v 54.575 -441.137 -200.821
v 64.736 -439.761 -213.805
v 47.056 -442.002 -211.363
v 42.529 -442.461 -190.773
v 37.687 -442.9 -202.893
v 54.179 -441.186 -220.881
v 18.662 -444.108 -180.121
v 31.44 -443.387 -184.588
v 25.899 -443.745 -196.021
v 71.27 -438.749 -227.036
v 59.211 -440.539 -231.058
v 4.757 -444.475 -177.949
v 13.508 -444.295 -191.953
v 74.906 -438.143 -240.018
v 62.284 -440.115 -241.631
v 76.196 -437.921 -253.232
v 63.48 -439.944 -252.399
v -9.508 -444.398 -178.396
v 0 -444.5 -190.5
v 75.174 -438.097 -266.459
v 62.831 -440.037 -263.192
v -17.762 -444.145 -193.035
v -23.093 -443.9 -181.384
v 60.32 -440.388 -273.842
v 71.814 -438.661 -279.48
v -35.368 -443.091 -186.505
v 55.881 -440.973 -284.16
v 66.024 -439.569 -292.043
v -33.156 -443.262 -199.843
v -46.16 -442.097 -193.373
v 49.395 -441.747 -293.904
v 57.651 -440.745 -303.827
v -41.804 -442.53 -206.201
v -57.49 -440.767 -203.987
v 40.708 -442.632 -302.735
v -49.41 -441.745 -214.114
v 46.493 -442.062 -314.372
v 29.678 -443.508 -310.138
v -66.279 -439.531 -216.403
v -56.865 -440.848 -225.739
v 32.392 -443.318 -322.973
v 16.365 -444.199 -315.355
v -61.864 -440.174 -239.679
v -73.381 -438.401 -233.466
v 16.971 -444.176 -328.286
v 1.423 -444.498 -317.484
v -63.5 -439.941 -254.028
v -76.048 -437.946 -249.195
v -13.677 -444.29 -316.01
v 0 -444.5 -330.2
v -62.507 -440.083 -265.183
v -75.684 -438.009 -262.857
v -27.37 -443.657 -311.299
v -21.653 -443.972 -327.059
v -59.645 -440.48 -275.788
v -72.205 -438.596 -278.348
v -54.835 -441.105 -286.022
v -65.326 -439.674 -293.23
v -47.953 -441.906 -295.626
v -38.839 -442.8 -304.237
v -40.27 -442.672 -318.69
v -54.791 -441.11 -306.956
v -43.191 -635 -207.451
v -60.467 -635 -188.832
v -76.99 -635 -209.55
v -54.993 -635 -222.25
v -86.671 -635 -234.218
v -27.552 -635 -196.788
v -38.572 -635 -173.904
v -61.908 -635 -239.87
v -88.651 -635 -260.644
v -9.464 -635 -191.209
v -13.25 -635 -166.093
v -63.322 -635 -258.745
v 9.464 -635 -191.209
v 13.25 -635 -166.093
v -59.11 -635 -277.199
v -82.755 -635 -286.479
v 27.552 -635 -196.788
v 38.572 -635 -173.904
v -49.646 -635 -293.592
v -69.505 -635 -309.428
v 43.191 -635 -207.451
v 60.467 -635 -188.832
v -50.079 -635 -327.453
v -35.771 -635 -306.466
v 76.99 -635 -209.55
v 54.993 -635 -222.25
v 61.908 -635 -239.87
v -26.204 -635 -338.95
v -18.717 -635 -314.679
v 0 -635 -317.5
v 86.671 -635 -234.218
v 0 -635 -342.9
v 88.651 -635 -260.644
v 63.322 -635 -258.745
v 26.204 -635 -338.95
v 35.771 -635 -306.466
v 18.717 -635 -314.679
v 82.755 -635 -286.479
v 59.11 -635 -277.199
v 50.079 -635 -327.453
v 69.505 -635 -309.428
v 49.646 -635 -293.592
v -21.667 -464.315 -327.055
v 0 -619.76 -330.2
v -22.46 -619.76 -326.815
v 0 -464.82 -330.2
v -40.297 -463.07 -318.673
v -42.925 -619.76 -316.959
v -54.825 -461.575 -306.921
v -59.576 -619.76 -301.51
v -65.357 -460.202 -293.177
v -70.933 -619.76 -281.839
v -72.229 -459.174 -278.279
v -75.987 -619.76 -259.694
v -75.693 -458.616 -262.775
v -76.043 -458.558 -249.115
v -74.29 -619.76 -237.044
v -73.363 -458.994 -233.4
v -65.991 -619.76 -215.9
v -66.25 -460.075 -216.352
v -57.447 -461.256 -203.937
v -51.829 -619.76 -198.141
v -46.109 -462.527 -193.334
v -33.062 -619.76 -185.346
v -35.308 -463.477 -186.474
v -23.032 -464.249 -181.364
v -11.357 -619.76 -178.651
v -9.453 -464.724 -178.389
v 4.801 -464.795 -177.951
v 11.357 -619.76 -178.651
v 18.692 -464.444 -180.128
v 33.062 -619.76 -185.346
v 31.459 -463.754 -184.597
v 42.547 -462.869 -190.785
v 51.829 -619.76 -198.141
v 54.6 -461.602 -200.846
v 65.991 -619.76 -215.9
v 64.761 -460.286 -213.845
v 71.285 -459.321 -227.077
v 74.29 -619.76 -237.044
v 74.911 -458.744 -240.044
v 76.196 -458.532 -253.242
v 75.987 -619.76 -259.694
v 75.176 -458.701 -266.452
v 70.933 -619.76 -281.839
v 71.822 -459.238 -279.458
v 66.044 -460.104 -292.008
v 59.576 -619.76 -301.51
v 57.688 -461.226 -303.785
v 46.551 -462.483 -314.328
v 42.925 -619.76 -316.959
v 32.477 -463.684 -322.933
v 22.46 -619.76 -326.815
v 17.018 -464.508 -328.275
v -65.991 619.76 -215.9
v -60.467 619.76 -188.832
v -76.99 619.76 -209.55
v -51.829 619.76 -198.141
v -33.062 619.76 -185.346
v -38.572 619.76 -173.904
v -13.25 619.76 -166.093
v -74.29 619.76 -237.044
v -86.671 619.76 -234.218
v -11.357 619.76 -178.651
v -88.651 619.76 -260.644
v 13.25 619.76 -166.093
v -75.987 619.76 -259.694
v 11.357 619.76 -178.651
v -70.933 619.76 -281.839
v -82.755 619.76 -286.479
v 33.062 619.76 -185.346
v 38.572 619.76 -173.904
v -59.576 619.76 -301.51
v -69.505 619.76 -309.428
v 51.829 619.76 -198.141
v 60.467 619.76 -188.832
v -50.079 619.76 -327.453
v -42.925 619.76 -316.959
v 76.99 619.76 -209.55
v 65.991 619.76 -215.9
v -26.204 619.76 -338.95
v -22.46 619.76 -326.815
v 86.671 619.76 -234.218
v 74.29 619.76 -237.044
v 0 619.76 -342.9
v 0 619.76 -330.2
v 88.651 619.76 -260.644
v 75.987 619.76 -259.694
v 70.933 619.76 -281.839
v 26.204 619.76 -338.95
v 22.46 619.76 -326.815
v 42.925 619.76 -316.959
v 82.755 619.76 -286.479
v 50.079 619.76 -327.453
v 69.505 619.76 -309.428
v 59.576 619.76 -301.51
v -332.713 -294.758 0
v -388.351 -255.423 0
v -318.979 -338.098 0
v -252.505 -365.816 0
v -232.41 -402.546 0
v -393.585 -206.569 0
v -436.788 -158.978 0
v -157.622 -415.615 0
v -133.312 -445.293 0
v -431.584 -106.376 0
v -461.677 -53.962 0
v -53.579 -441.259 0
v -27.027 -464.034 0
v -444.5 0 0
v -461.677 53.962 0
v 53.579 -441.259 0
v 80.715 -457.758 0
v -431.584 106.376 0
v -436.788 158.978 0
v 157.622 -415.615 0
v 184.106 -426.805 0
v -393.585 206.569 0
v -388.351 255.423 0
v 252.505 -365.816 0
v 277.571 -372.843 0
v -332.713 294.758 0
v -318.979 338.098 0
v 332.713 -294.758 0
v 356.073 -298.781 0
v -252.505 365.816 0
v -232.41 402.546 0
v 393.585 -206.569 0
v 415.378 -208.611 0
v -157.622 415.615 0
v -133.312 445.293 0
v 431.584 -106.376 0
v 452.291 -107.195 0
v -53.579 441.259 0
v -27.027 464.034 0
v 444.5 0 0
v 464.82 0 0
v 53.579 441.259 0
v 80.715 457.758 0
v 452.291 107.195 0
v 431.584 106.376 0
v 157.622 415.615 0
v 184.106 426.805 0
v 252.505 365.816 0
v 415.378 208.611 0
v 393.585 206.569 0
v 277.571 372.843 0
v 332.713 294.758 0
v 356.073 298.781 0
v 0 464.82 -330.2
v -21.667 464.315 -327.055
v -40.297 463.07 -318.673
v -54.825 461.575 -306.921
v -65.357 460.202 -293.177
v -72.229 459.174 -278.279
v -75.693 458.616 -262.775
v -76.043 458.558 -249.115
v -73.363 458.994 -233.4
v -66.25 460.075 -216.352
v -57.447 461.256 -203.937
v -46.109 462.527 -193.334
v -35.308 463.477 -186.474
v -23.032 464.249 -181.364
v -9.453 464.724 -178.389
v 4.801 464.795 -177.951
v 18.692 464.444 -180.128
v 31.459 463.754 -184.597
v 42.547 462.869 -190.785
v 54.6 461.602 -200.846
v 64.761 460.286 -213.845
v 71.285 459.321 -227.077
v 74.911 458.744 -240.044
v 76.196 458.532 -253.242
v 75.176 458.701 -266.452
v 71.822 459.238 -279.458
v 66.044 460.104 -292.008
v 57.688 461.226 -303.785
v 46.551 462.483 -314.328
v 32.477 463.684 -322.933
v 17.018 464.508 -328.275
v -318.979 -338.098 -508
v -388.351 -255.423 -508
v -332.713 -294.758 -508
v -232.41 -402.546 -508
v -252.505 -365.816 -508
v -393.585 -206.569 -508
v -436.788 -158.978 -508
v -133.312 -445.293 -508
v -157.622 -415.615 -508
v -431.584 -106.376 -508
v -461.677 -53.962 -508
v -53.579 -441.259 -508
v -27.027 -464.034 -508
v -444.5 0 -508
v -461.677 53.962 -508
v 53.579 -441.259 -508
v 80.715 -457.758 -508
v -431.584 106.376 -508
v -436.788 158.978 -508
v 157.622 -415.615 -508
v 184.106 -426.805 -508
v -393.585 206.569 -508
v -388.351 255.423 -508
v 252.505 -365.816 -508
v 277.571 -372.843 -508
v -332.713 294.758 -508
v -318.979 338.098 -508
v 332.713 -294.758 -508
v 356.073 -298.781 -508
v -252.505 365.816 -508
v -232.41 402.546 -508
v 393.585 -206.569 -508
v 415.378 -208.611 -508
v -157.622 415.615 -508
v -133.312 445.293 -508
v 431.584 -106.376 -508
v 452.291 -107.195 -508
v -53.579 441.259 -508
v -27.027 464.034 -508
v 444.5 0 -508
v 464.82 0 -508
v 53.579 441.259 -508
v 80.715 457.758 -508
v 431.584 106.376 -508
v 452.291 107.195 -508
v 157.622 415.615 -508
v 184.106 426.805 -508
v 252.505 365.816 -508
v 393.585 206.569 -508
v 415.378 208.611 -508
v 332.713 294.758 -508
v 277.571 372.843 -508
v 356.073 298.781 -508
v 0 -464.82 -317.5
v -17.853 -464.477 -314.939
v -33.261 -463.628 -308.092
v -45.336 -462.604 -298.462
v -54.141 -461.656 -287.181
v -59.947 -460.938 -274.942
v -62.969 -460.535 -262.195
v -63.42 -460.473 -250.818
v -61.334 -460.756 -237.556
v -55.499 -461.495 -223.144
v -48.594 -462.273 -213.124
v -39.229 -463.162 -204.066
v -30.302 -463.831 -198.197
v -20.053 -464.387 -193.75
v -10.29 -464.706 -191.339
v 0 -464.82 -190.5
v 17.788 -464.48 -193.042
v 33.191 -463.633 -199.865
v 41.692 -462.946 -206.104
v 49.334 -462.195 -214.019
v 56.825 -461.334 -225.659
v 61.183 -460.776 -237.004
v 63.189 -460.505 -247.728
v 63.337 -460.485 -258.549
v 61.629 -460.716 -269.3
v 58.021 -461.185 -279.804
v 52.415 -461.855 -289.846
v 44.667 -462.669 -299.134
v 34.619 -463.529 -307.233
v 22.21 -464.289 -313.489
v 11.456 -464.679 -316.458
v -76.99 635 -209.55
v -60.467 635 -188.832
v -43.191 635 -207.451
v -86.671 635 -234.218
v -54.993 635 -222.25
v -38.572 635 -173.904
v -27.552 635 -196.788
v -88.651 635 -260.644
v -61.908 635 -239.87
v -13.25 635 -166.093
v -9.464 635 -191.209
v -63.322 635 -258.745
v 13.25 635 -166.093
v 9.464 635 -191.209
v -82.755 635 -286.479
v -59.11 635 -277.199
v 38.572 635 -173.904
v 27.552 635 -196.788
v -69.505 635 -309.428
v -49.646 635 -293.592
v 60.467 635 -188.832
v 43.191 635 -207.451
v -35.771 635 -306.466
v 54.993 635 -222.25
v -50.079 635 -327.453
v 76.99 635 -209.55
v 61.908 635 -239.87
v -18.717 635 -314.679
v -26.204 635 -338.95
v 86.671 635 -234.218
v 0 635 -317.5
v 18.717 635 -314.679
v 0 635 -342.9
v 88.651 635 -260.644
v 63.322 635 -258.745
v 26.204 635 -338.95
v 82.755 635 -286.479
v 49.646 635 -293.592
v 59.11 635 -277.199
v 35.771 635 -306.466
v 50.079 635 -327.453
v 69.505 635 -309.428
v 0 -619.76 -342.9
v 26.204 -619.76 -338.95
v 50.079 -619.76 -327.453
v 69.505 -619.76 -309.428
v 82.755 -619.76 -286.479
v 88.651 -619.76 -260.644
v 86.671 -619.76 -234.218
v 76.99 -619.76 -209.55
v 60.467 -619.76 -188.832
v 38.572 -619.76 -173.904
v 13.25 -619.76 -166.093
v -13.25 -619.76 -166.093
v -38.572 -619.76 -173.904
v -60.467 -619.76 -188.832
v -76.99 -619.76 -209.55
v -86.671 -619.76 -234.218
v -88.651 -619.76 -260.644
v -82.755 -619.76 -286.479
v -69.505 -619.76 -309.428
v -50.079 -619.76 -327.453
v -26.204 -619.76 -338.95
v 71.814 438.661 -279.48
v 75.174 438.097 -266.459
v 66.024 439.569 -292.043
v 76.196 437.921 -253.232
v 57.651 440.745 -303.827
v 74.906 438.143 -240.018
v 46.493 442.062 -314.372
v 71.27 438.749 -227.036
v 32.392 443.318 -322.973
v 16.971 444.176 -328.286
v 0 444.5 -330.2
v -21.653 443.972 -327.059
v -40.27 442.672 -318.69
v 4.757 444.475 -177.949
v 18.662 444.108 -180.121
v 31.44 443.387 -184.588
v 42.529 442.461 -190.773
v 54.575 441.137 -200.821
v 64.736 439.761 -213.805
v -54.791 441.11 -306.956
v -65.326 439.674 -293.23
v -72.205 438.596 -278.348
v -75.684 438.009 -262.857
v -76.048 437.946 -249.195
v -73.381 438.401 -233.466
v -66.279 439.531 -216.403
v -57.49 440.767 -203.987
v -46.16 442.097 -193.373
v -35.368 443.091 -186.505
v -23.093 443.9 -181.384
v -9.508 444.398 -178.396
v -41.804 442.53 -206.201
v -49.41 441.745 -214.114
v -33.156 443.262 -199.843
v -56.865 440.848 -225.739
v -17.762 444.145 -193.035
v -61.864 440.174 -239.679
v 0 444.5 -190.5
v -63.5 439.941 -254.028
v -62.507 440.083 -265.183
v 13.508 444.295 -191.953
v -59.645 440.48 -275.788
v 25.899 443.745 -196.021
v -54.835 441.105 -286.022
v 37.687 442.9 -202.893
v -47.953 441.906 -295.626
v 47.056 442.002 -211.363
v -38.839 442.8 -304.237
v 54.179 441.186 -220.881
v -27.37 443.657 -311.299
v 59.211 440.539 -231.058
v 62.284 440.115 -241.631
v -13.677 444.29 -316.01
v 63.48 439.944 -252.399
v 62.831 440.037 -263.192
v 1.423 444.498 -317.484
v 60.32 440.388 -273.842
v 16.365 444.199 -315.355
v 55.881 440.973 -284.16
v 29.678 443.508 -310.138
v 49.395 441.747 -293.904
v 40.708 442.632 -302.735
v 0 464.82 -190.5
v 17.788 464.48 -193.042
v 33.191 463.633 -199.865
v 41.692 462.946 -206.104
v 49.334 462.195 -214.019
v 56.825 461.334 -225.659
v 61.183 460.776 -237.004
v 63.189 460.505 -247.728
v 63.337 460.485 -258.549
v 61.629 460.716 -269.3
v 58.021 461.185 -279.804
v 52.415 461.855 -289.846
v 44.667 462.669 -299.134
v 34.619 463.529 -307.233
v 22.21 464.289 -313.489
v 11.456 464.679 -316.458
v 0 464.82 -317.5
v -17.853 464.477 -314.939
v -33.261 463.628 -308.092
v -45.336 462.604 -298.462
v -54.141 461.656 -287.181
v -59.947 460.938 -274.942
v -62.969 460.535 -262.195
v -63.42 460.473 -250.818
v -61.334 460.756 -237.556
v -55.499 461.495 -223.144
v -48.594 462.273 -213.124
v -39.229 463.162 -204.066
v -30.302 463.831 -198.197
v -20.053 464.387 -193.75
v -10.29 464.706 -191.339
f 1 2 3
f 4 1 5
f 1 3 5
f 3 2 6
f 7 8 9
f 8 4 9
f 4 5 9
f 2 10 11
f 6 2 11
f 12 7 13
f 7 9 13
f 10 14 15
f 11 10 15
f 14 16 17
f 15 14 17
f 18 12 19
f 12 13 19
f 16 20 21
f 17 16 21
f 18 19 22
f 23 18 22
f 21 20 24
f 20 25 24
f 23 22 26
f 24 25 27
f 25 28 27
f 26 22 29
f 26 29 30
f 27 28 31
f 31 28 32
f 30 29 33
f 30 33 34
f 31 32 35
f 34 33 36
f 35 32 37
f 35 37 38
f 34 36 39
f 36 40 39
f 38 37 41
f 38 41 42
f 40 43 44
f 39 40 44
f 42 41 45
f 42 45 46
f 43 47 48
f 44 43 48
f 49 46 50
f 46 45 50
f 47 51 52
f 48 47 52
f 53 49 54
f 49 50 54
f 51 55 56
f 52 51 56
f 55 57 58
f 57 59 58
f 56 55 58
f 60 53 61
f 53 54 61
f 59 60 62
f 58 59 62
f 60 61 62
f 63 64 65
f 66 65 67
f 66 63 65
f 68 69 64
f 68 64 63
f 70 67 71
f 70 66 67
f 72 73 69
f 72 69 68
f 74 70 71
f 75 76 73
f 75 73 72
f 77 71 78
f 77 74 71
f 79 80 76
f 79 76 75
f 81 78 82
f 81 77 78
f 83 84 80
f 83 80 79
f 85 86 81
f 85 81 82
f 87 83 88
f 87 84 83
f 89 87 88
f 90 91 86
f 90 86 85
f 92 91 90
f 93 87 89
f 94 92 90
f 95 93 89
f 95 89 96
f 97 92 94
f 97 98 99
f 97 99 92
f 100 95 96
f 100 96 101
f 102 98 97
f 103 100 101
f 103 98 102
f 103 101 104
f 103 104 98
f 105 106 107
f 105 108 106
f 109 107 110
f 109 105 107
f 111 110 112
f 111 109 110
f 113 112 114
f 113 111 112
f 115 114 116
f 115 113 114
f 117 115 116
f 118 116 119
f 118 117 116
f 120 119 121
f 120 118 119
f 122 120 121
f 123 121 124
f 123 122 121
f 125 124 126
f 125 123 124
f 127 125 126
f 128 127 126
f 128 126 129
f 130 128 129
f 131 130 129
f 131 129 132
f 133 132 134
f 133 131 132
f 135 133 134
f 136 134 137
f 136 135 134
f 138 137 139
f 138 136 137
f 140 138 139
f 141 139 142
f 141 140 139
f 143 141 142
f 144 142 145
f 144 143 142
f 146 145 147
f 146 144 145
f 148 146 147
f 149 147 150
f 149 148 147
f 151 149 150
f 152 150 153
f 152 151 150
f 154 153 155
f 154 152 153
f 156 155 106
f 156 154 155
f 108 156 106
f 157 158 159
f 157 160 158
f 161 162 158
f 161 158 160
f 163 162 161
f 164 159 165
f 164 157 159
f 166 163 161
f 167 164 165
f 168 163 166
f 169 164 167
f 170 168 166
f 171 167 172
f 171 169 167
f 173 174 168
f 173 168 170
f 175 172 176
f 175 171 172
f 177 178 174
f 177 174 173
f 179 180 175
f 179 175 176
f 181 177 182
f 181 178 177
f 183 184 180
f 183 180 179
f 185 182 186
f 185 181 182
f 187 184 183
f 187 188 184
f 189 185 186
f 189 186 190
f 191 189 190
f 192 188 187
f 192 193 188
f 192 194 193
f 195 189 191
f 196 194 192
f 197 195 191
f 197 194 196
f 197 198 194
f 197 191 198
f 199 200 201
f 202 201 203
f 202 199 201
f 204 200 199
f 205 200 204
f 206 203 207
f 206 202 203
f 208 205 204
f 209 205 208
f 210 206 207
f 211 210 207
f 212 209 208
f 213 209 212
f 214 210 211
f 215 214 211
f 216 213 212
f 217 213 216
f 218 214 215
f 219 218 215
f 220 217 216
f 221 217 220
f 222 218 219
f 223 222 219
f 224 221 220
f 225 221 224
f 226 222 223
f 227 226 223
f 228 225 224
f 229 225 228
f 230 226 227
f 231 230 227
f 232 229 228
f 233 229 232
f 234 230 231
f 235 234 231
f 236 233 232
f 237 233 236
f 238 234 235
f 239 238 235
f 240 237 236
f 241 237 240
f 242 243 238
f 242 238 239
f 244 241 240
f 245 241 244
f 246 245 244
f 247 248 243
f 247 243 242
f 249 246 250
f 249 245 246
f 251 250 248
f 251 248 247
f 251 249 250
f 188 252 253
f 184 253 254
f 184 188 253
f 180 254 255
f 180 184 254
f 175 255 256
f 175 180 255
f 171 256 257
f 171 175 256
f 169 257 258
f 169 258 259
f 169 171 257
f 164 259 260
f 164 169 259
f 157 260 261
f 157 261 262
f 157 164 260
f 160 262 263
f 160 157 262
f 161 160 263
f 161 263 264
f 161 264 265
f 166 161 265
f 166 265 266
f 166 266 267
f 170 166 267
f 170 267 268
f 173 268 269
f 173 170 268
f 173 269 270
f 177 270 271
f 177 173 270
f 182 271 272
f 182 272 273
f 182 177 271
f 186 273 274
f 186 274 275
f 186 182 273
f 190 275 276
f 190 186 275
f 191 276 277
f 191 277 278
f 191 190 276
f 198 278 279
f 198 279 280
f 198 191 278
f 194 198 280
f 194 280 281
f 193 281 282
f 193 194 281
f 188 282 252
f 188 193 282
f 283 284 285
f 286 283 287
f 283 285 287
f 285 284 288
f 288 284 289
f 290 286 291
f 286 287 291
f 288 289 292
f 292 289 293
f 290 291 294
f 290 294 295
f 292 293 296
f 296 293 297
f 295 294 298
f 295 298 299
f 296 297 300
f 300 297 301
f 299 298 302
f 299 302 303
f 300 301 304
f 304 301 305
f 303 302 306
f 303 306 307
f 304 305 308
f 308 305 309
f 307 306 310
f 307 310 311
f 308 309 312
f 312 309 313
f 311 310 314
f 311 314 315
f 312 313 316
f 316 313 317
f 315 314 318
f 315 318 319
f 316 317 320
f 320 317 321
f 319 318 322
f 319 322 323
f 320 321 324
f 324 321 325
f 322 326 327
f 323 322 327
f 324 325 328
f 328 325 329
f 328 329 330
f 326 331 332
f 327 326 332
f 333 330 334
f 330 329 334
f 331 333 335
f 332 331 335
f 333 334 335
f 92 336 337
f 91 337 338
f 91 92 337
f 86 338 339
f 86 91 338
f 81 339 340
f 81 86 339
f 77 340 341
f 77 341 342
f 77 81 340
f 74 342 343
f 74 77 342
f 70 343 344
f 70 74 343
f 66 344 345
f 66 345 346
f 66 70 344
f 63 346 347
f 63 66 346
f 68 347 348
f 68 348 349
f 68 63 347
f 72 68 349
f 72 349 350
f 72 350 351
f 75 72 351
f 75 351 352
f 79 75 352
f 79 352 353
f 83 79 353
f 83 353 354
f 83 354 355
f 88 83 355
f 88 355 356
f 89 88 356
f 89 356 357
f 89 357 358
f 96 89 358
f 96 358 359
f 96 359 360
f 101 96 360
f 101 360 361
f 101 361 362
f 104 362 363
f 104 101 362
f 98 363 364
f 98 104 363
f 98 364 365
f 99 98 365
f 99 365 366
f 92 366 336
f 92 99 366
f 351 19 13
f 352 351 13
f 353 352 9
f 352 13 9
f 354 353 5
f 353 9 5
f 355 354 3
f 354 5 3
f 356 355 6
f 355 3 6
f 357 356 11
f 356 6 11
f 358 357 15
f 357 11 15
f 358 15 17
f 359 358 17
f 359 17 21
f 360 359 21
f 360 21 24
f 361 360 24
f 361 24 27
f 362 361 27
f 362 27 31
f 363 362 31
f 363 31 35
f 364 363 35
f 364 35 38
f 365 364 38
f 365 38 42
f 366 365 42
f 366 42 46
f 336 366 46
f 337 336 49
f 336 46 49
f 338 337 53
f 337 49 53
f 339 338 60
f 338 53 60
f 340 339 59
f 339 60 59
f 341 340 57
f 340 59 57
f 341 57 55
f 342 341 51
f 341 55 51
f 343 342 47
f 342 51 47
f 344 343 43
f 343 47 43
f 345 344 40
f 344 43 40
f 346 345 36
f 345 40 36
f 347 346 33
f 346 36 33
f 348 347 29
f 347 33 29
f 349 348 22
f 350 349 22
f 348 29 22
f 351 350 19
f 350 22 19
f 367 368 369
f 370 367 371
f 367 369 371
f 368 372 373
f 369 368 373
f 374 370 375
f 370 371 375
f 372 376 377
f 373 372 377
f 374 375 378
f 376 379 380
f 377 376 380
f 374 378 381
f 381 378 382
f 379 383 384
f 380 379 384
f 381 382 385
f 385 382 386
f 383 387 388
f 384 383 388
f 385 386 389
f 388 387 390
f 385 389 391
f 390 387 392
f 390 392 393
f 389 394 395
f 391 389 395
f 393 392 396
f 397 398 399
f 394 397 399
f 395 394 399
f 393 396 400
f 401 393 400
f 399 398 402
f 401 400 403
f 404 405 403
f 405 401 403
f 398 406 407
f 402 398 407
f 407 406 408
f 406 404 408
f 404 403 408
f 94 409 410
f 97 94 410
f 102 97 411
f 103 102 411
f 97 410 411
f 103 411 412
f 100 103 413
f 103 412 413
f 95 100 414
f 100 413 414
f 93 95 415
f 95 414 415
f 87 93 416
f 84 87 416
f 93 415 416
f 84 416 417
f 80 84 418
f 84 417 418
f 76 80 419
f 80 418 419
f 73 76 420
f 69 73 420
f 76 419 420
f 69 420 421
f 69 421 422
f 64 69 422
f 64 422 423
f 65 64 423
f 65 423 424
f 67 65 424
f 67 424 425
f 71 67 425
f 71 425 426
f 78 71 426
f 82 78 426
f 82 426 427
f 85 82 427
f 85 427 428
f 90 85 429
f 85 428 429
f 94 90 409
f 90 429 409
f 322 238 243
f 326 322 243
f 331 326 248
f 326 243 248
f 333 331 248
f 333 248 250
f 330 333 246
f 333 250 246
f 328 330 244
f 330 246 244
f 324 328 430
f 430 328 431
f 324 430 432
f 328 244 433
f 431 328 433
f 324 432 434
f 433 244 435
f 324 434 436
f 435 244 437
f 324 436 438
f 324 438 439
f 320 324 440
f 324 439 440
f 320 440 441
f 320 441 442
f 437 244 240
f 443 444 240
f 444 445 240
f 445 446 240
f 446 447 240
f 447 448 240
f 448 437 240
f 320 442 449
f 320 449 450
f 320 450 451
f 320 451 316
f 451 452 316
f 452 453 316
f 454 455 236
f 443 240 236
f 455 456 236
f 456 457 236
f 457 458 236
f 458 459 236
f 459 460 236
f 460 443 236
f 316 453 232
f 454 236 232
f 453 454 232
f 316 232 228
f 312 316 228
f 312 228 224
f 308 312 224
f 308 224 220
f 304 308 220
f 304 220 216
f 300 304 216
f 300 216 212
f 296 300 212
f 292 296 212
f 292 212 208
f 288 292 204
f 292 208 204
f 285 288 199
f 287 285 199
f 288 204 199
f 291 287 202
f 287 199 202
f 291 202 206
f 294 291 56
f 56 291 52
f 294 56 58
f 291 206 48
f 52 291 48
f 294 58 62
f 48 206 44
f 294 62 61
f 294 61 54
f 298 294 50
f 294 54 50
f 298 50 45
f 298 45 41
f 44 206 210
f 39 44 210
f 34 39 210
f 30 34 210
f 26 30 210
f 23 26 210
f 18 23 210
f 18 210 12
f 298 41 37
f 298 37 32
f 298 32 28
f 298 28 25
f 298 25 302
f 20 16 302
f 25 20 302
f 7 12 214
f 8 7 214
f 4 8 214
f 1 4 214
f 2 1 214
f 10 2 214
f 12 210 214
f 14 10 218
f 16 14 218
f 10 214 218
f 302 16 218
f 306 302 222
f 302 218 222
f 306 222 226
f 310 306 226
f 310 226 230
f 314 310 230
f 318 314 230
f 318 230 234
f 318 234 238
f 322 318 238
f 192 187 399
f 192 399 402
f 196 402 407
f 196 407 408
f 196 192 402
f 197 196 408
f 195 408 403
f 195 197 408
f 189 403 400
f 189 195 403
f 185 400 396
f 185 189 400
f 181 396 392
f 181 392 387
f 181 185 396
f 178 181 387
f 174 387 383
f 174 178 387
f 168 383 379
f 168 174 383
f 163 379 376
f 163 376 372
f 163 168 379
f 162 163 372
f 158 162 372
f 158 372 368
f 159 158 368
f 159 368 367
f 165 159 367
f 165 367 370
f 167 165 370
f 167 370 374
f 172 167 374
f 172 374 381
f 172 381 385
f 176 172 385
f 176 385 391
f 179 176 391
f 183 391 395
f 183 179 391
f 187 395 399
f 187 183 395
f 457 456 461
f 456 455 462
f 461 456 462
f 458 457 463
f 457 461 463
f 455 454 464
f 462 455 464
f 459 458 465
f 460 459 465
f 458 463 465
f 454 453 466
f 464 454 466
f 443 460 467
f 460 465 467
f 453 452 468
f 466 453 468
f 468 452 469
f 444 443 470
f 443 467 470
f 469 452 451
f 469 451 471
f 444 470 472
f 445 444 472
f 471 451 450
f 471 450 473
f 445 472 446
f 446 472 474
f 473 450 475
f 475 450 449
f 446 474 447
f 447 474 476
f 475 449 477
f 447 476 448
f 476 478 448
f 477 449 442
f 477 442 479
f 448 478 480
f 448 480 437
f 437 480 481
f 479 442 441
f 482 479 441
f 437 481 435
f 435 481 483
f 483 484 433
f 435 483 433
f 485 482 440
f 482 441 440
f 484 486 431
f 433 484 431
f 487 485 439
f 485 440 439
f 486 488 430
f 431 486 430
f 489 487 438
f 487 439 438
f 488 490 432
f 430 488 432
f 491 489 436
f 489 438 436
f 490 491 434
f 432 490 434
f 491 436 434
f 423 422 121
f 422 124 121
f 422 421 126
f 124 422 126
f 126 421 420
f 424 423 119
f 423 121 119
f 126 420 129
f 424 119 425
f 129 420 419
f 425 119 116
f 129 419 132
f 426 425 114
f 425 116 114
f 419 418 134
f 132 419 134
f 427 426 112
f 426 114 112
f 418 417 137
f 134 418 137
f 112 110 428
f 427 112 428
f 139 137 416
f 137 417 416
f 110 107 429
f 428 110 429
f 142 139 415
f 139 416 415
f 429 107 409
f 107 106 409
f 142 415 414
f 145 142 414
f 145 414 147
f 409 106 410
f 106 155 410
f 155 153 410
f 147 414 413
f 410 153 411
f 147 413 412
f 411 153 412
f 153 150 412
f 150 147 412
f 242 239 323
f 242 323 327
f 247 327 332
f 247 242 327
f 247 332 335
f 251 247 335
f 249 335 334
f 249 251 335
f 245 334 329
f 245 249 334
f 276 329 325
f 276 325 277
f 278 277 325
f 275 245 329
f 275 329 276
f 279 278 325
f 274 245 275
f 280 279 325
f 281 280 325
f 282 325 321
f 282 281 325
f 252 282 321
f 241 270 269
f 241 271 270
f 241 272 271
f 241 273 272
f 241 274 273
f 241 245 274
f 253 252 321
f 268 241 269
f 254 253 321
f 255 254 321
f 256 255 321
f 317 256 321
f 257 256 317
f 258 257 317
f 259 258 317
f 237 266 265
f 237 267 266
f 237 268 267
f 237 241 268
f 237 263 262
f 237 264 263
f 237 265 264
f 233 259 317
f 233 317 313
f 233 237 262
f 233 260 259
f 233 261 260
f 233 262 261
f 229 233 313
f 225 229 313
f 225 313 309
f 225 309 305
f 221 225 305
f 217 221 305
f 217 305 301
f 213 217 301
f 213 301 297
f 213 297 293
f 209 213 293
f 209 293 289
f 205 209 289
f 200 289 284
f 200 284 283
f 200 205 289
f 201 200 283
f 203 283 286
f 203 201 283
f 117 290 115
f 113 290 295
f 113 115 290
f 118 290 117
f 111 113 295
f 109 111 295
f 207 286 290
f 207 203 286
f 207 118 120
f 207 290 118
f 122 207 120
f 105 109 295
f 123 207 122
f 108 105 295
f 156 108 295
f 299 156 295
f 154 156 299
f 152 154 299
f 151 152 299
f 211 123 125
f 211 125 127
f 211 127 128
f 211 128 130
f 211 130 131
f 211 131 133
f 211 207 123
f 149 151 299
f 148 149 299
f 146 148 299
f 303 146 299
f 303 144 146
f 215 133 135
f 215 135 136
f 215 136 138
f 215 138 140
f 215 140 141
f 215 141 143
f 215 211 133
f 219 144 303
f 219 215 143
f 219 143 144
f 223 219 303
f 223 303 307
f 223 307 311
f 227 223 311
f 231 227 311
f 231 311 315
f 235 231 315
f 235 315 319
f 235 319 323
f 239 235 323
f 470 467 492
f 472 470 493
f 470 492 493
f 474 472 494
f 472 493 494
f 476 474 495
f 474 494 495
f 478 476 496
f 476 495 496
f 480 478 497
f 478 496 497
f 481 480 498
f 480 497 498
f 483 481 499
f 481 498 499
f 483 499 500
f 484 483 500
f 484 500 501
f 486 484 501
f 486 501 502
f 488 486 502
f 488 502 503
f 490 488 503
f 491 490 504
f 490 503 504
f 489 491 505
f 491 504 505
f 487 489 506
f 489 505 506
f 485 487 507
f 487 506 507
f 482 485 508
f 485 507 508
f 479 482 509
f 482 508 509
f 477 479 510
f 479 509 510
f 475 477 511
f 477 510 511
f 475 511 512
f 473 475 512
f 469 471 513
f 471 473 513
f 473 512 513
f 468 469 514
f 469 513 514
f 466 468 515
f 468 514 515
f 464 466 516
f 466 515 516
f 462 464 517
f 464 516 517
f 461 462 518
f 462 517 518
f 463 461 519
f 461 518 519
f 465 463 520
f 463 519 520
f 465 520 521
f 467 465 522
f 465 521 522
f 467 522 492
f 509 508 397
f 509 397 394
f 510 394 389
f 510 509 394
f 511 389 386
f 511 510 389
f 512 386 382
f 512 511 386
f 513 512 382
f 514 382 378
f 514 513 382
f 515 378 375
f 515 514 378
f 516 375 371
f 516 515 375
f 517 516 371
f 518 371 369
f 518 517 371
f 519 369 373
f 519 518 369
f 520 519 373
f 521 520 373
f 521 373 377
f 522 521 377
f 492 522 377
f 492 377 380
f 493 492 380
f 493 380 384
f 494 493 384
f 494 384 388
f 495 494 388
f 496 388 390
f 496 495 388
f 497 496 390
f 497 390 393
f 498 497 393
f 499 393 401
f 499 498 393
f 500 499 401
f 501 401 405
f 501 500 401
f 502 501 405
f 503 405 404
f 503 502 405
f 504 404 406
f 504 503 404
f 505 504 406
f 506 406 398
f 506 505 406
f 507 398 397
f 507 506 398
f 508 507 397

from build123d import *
from build123d.topology import SkipClean

# Parameters (mm, degrees)
SKETCH1_R           = 464.82
SKETCH1_R_2         = 444.5
BOSS_EXTRUDE1_DEPTH = 508
SKETCH2_R           = 76.2
SKETCH2_R_2         = 63.5
BOSS_EXTRUDE2_DEPTH = 635
SKETCH3_R           = 444.5
CUT_EXTRUDE1_DEPTH  = 698.5
SKETCH4_R           = 63.5
CUT_EXTRUDE2_DEPTH  = 1810.258
BOSS_EXTRUDE3_START = -15.24
SKETCH5_R           = 88.9
SKETCH5_R_2         = 76.2
BOSS_EXTRUDE3_DEPTH = 15.24


with BuildPart() as part:
    # Sketch1 → Boss-Extrude1 (new body)
    with BuildSketch(Plane.XY):
        Circle(SKETCH1_R)
        Circle(SKETCH1_R_2, mode=Mode.SUBTRACT)
    extrude(amount=-BOSS_EXTRUDE1_DEPTH)

    # Sketch2 → Boss-Extrude2 (add, symmetric)
    with BuildSketch(Plane(origin=(0, 0, 0), x_dir=(1, 0, 0), z_dir=(0, 1, 0))):
        with Locations(Location((0, 254, 0), (0, 0, 90))):
            Circle(SKETCH2_R)
        with Locations(Location((0, 254, 0), (0, 0, 90))):
            Circle(SKETCH2_R_2, mode=Mode.SUBTRACT)
    extrude(amount=BOSS_EXTRUDE2_DEPTH, both=True)

    # Sketch3 → Cut-Extrude1 (cut, symmetric)
    with BuildSketch(Plane(origin=(0, 0, -508), x_dir=(-1, 0, 0), z_dir=(0, 0, -1))):
        with Locations(Location((0, 0, 0), (0, 0, 180))):
            Circle(SKETCH3_R)
    extrude(amount=CUT_EXTRUDE1_DEPTH, both=True, mode=Mode.SUBTRACT)

    # Sketch4 → Cut-Extrude2 (cut, symmetric)
    with SkipClean():  # the faces are left unmerged after this step: merging them gives an invalid solid
        with BuildSketch(Plane(origin=(0, 635, 0), x_dir=(1, 0, 0), z_dir=(0, 1, 0))):
            with Locations(Location((0, 254, 0), (0, 0, 270))):
                Circle(SKETCH4_R)
        extrude(amount=CUT_EXTRUDE2_DEPTH, both=True, mode=Mode.SUBTRACT)

    # Sketch5 → Boss-Extrude3 (add)
    with SkipClean():  # the faces are left unmerged after this step: merging them gives an invalid solid
        with BuildSketch(Plane.XZ.offset(635).offset(BOSS_EXTRUDE3_START)):
            with Locations(Location((0, -254, 0), (0, 0, 270))):
                Circle(SKETCH5_R)
            with Locations(Location((0, -254, 0), (0, 0, 270))):
                Circle(SKETCH5_R_2, mode=Mode.SUBTRACT)
        boss_extrude3 = extrude(amount=BOSS_EXTRUDE3_DEPTH)

    # Mirror1: Boss-Extrude3 across plane
    add(boss_extrude3.mirror(Plane.ZX))


solid = part.part
